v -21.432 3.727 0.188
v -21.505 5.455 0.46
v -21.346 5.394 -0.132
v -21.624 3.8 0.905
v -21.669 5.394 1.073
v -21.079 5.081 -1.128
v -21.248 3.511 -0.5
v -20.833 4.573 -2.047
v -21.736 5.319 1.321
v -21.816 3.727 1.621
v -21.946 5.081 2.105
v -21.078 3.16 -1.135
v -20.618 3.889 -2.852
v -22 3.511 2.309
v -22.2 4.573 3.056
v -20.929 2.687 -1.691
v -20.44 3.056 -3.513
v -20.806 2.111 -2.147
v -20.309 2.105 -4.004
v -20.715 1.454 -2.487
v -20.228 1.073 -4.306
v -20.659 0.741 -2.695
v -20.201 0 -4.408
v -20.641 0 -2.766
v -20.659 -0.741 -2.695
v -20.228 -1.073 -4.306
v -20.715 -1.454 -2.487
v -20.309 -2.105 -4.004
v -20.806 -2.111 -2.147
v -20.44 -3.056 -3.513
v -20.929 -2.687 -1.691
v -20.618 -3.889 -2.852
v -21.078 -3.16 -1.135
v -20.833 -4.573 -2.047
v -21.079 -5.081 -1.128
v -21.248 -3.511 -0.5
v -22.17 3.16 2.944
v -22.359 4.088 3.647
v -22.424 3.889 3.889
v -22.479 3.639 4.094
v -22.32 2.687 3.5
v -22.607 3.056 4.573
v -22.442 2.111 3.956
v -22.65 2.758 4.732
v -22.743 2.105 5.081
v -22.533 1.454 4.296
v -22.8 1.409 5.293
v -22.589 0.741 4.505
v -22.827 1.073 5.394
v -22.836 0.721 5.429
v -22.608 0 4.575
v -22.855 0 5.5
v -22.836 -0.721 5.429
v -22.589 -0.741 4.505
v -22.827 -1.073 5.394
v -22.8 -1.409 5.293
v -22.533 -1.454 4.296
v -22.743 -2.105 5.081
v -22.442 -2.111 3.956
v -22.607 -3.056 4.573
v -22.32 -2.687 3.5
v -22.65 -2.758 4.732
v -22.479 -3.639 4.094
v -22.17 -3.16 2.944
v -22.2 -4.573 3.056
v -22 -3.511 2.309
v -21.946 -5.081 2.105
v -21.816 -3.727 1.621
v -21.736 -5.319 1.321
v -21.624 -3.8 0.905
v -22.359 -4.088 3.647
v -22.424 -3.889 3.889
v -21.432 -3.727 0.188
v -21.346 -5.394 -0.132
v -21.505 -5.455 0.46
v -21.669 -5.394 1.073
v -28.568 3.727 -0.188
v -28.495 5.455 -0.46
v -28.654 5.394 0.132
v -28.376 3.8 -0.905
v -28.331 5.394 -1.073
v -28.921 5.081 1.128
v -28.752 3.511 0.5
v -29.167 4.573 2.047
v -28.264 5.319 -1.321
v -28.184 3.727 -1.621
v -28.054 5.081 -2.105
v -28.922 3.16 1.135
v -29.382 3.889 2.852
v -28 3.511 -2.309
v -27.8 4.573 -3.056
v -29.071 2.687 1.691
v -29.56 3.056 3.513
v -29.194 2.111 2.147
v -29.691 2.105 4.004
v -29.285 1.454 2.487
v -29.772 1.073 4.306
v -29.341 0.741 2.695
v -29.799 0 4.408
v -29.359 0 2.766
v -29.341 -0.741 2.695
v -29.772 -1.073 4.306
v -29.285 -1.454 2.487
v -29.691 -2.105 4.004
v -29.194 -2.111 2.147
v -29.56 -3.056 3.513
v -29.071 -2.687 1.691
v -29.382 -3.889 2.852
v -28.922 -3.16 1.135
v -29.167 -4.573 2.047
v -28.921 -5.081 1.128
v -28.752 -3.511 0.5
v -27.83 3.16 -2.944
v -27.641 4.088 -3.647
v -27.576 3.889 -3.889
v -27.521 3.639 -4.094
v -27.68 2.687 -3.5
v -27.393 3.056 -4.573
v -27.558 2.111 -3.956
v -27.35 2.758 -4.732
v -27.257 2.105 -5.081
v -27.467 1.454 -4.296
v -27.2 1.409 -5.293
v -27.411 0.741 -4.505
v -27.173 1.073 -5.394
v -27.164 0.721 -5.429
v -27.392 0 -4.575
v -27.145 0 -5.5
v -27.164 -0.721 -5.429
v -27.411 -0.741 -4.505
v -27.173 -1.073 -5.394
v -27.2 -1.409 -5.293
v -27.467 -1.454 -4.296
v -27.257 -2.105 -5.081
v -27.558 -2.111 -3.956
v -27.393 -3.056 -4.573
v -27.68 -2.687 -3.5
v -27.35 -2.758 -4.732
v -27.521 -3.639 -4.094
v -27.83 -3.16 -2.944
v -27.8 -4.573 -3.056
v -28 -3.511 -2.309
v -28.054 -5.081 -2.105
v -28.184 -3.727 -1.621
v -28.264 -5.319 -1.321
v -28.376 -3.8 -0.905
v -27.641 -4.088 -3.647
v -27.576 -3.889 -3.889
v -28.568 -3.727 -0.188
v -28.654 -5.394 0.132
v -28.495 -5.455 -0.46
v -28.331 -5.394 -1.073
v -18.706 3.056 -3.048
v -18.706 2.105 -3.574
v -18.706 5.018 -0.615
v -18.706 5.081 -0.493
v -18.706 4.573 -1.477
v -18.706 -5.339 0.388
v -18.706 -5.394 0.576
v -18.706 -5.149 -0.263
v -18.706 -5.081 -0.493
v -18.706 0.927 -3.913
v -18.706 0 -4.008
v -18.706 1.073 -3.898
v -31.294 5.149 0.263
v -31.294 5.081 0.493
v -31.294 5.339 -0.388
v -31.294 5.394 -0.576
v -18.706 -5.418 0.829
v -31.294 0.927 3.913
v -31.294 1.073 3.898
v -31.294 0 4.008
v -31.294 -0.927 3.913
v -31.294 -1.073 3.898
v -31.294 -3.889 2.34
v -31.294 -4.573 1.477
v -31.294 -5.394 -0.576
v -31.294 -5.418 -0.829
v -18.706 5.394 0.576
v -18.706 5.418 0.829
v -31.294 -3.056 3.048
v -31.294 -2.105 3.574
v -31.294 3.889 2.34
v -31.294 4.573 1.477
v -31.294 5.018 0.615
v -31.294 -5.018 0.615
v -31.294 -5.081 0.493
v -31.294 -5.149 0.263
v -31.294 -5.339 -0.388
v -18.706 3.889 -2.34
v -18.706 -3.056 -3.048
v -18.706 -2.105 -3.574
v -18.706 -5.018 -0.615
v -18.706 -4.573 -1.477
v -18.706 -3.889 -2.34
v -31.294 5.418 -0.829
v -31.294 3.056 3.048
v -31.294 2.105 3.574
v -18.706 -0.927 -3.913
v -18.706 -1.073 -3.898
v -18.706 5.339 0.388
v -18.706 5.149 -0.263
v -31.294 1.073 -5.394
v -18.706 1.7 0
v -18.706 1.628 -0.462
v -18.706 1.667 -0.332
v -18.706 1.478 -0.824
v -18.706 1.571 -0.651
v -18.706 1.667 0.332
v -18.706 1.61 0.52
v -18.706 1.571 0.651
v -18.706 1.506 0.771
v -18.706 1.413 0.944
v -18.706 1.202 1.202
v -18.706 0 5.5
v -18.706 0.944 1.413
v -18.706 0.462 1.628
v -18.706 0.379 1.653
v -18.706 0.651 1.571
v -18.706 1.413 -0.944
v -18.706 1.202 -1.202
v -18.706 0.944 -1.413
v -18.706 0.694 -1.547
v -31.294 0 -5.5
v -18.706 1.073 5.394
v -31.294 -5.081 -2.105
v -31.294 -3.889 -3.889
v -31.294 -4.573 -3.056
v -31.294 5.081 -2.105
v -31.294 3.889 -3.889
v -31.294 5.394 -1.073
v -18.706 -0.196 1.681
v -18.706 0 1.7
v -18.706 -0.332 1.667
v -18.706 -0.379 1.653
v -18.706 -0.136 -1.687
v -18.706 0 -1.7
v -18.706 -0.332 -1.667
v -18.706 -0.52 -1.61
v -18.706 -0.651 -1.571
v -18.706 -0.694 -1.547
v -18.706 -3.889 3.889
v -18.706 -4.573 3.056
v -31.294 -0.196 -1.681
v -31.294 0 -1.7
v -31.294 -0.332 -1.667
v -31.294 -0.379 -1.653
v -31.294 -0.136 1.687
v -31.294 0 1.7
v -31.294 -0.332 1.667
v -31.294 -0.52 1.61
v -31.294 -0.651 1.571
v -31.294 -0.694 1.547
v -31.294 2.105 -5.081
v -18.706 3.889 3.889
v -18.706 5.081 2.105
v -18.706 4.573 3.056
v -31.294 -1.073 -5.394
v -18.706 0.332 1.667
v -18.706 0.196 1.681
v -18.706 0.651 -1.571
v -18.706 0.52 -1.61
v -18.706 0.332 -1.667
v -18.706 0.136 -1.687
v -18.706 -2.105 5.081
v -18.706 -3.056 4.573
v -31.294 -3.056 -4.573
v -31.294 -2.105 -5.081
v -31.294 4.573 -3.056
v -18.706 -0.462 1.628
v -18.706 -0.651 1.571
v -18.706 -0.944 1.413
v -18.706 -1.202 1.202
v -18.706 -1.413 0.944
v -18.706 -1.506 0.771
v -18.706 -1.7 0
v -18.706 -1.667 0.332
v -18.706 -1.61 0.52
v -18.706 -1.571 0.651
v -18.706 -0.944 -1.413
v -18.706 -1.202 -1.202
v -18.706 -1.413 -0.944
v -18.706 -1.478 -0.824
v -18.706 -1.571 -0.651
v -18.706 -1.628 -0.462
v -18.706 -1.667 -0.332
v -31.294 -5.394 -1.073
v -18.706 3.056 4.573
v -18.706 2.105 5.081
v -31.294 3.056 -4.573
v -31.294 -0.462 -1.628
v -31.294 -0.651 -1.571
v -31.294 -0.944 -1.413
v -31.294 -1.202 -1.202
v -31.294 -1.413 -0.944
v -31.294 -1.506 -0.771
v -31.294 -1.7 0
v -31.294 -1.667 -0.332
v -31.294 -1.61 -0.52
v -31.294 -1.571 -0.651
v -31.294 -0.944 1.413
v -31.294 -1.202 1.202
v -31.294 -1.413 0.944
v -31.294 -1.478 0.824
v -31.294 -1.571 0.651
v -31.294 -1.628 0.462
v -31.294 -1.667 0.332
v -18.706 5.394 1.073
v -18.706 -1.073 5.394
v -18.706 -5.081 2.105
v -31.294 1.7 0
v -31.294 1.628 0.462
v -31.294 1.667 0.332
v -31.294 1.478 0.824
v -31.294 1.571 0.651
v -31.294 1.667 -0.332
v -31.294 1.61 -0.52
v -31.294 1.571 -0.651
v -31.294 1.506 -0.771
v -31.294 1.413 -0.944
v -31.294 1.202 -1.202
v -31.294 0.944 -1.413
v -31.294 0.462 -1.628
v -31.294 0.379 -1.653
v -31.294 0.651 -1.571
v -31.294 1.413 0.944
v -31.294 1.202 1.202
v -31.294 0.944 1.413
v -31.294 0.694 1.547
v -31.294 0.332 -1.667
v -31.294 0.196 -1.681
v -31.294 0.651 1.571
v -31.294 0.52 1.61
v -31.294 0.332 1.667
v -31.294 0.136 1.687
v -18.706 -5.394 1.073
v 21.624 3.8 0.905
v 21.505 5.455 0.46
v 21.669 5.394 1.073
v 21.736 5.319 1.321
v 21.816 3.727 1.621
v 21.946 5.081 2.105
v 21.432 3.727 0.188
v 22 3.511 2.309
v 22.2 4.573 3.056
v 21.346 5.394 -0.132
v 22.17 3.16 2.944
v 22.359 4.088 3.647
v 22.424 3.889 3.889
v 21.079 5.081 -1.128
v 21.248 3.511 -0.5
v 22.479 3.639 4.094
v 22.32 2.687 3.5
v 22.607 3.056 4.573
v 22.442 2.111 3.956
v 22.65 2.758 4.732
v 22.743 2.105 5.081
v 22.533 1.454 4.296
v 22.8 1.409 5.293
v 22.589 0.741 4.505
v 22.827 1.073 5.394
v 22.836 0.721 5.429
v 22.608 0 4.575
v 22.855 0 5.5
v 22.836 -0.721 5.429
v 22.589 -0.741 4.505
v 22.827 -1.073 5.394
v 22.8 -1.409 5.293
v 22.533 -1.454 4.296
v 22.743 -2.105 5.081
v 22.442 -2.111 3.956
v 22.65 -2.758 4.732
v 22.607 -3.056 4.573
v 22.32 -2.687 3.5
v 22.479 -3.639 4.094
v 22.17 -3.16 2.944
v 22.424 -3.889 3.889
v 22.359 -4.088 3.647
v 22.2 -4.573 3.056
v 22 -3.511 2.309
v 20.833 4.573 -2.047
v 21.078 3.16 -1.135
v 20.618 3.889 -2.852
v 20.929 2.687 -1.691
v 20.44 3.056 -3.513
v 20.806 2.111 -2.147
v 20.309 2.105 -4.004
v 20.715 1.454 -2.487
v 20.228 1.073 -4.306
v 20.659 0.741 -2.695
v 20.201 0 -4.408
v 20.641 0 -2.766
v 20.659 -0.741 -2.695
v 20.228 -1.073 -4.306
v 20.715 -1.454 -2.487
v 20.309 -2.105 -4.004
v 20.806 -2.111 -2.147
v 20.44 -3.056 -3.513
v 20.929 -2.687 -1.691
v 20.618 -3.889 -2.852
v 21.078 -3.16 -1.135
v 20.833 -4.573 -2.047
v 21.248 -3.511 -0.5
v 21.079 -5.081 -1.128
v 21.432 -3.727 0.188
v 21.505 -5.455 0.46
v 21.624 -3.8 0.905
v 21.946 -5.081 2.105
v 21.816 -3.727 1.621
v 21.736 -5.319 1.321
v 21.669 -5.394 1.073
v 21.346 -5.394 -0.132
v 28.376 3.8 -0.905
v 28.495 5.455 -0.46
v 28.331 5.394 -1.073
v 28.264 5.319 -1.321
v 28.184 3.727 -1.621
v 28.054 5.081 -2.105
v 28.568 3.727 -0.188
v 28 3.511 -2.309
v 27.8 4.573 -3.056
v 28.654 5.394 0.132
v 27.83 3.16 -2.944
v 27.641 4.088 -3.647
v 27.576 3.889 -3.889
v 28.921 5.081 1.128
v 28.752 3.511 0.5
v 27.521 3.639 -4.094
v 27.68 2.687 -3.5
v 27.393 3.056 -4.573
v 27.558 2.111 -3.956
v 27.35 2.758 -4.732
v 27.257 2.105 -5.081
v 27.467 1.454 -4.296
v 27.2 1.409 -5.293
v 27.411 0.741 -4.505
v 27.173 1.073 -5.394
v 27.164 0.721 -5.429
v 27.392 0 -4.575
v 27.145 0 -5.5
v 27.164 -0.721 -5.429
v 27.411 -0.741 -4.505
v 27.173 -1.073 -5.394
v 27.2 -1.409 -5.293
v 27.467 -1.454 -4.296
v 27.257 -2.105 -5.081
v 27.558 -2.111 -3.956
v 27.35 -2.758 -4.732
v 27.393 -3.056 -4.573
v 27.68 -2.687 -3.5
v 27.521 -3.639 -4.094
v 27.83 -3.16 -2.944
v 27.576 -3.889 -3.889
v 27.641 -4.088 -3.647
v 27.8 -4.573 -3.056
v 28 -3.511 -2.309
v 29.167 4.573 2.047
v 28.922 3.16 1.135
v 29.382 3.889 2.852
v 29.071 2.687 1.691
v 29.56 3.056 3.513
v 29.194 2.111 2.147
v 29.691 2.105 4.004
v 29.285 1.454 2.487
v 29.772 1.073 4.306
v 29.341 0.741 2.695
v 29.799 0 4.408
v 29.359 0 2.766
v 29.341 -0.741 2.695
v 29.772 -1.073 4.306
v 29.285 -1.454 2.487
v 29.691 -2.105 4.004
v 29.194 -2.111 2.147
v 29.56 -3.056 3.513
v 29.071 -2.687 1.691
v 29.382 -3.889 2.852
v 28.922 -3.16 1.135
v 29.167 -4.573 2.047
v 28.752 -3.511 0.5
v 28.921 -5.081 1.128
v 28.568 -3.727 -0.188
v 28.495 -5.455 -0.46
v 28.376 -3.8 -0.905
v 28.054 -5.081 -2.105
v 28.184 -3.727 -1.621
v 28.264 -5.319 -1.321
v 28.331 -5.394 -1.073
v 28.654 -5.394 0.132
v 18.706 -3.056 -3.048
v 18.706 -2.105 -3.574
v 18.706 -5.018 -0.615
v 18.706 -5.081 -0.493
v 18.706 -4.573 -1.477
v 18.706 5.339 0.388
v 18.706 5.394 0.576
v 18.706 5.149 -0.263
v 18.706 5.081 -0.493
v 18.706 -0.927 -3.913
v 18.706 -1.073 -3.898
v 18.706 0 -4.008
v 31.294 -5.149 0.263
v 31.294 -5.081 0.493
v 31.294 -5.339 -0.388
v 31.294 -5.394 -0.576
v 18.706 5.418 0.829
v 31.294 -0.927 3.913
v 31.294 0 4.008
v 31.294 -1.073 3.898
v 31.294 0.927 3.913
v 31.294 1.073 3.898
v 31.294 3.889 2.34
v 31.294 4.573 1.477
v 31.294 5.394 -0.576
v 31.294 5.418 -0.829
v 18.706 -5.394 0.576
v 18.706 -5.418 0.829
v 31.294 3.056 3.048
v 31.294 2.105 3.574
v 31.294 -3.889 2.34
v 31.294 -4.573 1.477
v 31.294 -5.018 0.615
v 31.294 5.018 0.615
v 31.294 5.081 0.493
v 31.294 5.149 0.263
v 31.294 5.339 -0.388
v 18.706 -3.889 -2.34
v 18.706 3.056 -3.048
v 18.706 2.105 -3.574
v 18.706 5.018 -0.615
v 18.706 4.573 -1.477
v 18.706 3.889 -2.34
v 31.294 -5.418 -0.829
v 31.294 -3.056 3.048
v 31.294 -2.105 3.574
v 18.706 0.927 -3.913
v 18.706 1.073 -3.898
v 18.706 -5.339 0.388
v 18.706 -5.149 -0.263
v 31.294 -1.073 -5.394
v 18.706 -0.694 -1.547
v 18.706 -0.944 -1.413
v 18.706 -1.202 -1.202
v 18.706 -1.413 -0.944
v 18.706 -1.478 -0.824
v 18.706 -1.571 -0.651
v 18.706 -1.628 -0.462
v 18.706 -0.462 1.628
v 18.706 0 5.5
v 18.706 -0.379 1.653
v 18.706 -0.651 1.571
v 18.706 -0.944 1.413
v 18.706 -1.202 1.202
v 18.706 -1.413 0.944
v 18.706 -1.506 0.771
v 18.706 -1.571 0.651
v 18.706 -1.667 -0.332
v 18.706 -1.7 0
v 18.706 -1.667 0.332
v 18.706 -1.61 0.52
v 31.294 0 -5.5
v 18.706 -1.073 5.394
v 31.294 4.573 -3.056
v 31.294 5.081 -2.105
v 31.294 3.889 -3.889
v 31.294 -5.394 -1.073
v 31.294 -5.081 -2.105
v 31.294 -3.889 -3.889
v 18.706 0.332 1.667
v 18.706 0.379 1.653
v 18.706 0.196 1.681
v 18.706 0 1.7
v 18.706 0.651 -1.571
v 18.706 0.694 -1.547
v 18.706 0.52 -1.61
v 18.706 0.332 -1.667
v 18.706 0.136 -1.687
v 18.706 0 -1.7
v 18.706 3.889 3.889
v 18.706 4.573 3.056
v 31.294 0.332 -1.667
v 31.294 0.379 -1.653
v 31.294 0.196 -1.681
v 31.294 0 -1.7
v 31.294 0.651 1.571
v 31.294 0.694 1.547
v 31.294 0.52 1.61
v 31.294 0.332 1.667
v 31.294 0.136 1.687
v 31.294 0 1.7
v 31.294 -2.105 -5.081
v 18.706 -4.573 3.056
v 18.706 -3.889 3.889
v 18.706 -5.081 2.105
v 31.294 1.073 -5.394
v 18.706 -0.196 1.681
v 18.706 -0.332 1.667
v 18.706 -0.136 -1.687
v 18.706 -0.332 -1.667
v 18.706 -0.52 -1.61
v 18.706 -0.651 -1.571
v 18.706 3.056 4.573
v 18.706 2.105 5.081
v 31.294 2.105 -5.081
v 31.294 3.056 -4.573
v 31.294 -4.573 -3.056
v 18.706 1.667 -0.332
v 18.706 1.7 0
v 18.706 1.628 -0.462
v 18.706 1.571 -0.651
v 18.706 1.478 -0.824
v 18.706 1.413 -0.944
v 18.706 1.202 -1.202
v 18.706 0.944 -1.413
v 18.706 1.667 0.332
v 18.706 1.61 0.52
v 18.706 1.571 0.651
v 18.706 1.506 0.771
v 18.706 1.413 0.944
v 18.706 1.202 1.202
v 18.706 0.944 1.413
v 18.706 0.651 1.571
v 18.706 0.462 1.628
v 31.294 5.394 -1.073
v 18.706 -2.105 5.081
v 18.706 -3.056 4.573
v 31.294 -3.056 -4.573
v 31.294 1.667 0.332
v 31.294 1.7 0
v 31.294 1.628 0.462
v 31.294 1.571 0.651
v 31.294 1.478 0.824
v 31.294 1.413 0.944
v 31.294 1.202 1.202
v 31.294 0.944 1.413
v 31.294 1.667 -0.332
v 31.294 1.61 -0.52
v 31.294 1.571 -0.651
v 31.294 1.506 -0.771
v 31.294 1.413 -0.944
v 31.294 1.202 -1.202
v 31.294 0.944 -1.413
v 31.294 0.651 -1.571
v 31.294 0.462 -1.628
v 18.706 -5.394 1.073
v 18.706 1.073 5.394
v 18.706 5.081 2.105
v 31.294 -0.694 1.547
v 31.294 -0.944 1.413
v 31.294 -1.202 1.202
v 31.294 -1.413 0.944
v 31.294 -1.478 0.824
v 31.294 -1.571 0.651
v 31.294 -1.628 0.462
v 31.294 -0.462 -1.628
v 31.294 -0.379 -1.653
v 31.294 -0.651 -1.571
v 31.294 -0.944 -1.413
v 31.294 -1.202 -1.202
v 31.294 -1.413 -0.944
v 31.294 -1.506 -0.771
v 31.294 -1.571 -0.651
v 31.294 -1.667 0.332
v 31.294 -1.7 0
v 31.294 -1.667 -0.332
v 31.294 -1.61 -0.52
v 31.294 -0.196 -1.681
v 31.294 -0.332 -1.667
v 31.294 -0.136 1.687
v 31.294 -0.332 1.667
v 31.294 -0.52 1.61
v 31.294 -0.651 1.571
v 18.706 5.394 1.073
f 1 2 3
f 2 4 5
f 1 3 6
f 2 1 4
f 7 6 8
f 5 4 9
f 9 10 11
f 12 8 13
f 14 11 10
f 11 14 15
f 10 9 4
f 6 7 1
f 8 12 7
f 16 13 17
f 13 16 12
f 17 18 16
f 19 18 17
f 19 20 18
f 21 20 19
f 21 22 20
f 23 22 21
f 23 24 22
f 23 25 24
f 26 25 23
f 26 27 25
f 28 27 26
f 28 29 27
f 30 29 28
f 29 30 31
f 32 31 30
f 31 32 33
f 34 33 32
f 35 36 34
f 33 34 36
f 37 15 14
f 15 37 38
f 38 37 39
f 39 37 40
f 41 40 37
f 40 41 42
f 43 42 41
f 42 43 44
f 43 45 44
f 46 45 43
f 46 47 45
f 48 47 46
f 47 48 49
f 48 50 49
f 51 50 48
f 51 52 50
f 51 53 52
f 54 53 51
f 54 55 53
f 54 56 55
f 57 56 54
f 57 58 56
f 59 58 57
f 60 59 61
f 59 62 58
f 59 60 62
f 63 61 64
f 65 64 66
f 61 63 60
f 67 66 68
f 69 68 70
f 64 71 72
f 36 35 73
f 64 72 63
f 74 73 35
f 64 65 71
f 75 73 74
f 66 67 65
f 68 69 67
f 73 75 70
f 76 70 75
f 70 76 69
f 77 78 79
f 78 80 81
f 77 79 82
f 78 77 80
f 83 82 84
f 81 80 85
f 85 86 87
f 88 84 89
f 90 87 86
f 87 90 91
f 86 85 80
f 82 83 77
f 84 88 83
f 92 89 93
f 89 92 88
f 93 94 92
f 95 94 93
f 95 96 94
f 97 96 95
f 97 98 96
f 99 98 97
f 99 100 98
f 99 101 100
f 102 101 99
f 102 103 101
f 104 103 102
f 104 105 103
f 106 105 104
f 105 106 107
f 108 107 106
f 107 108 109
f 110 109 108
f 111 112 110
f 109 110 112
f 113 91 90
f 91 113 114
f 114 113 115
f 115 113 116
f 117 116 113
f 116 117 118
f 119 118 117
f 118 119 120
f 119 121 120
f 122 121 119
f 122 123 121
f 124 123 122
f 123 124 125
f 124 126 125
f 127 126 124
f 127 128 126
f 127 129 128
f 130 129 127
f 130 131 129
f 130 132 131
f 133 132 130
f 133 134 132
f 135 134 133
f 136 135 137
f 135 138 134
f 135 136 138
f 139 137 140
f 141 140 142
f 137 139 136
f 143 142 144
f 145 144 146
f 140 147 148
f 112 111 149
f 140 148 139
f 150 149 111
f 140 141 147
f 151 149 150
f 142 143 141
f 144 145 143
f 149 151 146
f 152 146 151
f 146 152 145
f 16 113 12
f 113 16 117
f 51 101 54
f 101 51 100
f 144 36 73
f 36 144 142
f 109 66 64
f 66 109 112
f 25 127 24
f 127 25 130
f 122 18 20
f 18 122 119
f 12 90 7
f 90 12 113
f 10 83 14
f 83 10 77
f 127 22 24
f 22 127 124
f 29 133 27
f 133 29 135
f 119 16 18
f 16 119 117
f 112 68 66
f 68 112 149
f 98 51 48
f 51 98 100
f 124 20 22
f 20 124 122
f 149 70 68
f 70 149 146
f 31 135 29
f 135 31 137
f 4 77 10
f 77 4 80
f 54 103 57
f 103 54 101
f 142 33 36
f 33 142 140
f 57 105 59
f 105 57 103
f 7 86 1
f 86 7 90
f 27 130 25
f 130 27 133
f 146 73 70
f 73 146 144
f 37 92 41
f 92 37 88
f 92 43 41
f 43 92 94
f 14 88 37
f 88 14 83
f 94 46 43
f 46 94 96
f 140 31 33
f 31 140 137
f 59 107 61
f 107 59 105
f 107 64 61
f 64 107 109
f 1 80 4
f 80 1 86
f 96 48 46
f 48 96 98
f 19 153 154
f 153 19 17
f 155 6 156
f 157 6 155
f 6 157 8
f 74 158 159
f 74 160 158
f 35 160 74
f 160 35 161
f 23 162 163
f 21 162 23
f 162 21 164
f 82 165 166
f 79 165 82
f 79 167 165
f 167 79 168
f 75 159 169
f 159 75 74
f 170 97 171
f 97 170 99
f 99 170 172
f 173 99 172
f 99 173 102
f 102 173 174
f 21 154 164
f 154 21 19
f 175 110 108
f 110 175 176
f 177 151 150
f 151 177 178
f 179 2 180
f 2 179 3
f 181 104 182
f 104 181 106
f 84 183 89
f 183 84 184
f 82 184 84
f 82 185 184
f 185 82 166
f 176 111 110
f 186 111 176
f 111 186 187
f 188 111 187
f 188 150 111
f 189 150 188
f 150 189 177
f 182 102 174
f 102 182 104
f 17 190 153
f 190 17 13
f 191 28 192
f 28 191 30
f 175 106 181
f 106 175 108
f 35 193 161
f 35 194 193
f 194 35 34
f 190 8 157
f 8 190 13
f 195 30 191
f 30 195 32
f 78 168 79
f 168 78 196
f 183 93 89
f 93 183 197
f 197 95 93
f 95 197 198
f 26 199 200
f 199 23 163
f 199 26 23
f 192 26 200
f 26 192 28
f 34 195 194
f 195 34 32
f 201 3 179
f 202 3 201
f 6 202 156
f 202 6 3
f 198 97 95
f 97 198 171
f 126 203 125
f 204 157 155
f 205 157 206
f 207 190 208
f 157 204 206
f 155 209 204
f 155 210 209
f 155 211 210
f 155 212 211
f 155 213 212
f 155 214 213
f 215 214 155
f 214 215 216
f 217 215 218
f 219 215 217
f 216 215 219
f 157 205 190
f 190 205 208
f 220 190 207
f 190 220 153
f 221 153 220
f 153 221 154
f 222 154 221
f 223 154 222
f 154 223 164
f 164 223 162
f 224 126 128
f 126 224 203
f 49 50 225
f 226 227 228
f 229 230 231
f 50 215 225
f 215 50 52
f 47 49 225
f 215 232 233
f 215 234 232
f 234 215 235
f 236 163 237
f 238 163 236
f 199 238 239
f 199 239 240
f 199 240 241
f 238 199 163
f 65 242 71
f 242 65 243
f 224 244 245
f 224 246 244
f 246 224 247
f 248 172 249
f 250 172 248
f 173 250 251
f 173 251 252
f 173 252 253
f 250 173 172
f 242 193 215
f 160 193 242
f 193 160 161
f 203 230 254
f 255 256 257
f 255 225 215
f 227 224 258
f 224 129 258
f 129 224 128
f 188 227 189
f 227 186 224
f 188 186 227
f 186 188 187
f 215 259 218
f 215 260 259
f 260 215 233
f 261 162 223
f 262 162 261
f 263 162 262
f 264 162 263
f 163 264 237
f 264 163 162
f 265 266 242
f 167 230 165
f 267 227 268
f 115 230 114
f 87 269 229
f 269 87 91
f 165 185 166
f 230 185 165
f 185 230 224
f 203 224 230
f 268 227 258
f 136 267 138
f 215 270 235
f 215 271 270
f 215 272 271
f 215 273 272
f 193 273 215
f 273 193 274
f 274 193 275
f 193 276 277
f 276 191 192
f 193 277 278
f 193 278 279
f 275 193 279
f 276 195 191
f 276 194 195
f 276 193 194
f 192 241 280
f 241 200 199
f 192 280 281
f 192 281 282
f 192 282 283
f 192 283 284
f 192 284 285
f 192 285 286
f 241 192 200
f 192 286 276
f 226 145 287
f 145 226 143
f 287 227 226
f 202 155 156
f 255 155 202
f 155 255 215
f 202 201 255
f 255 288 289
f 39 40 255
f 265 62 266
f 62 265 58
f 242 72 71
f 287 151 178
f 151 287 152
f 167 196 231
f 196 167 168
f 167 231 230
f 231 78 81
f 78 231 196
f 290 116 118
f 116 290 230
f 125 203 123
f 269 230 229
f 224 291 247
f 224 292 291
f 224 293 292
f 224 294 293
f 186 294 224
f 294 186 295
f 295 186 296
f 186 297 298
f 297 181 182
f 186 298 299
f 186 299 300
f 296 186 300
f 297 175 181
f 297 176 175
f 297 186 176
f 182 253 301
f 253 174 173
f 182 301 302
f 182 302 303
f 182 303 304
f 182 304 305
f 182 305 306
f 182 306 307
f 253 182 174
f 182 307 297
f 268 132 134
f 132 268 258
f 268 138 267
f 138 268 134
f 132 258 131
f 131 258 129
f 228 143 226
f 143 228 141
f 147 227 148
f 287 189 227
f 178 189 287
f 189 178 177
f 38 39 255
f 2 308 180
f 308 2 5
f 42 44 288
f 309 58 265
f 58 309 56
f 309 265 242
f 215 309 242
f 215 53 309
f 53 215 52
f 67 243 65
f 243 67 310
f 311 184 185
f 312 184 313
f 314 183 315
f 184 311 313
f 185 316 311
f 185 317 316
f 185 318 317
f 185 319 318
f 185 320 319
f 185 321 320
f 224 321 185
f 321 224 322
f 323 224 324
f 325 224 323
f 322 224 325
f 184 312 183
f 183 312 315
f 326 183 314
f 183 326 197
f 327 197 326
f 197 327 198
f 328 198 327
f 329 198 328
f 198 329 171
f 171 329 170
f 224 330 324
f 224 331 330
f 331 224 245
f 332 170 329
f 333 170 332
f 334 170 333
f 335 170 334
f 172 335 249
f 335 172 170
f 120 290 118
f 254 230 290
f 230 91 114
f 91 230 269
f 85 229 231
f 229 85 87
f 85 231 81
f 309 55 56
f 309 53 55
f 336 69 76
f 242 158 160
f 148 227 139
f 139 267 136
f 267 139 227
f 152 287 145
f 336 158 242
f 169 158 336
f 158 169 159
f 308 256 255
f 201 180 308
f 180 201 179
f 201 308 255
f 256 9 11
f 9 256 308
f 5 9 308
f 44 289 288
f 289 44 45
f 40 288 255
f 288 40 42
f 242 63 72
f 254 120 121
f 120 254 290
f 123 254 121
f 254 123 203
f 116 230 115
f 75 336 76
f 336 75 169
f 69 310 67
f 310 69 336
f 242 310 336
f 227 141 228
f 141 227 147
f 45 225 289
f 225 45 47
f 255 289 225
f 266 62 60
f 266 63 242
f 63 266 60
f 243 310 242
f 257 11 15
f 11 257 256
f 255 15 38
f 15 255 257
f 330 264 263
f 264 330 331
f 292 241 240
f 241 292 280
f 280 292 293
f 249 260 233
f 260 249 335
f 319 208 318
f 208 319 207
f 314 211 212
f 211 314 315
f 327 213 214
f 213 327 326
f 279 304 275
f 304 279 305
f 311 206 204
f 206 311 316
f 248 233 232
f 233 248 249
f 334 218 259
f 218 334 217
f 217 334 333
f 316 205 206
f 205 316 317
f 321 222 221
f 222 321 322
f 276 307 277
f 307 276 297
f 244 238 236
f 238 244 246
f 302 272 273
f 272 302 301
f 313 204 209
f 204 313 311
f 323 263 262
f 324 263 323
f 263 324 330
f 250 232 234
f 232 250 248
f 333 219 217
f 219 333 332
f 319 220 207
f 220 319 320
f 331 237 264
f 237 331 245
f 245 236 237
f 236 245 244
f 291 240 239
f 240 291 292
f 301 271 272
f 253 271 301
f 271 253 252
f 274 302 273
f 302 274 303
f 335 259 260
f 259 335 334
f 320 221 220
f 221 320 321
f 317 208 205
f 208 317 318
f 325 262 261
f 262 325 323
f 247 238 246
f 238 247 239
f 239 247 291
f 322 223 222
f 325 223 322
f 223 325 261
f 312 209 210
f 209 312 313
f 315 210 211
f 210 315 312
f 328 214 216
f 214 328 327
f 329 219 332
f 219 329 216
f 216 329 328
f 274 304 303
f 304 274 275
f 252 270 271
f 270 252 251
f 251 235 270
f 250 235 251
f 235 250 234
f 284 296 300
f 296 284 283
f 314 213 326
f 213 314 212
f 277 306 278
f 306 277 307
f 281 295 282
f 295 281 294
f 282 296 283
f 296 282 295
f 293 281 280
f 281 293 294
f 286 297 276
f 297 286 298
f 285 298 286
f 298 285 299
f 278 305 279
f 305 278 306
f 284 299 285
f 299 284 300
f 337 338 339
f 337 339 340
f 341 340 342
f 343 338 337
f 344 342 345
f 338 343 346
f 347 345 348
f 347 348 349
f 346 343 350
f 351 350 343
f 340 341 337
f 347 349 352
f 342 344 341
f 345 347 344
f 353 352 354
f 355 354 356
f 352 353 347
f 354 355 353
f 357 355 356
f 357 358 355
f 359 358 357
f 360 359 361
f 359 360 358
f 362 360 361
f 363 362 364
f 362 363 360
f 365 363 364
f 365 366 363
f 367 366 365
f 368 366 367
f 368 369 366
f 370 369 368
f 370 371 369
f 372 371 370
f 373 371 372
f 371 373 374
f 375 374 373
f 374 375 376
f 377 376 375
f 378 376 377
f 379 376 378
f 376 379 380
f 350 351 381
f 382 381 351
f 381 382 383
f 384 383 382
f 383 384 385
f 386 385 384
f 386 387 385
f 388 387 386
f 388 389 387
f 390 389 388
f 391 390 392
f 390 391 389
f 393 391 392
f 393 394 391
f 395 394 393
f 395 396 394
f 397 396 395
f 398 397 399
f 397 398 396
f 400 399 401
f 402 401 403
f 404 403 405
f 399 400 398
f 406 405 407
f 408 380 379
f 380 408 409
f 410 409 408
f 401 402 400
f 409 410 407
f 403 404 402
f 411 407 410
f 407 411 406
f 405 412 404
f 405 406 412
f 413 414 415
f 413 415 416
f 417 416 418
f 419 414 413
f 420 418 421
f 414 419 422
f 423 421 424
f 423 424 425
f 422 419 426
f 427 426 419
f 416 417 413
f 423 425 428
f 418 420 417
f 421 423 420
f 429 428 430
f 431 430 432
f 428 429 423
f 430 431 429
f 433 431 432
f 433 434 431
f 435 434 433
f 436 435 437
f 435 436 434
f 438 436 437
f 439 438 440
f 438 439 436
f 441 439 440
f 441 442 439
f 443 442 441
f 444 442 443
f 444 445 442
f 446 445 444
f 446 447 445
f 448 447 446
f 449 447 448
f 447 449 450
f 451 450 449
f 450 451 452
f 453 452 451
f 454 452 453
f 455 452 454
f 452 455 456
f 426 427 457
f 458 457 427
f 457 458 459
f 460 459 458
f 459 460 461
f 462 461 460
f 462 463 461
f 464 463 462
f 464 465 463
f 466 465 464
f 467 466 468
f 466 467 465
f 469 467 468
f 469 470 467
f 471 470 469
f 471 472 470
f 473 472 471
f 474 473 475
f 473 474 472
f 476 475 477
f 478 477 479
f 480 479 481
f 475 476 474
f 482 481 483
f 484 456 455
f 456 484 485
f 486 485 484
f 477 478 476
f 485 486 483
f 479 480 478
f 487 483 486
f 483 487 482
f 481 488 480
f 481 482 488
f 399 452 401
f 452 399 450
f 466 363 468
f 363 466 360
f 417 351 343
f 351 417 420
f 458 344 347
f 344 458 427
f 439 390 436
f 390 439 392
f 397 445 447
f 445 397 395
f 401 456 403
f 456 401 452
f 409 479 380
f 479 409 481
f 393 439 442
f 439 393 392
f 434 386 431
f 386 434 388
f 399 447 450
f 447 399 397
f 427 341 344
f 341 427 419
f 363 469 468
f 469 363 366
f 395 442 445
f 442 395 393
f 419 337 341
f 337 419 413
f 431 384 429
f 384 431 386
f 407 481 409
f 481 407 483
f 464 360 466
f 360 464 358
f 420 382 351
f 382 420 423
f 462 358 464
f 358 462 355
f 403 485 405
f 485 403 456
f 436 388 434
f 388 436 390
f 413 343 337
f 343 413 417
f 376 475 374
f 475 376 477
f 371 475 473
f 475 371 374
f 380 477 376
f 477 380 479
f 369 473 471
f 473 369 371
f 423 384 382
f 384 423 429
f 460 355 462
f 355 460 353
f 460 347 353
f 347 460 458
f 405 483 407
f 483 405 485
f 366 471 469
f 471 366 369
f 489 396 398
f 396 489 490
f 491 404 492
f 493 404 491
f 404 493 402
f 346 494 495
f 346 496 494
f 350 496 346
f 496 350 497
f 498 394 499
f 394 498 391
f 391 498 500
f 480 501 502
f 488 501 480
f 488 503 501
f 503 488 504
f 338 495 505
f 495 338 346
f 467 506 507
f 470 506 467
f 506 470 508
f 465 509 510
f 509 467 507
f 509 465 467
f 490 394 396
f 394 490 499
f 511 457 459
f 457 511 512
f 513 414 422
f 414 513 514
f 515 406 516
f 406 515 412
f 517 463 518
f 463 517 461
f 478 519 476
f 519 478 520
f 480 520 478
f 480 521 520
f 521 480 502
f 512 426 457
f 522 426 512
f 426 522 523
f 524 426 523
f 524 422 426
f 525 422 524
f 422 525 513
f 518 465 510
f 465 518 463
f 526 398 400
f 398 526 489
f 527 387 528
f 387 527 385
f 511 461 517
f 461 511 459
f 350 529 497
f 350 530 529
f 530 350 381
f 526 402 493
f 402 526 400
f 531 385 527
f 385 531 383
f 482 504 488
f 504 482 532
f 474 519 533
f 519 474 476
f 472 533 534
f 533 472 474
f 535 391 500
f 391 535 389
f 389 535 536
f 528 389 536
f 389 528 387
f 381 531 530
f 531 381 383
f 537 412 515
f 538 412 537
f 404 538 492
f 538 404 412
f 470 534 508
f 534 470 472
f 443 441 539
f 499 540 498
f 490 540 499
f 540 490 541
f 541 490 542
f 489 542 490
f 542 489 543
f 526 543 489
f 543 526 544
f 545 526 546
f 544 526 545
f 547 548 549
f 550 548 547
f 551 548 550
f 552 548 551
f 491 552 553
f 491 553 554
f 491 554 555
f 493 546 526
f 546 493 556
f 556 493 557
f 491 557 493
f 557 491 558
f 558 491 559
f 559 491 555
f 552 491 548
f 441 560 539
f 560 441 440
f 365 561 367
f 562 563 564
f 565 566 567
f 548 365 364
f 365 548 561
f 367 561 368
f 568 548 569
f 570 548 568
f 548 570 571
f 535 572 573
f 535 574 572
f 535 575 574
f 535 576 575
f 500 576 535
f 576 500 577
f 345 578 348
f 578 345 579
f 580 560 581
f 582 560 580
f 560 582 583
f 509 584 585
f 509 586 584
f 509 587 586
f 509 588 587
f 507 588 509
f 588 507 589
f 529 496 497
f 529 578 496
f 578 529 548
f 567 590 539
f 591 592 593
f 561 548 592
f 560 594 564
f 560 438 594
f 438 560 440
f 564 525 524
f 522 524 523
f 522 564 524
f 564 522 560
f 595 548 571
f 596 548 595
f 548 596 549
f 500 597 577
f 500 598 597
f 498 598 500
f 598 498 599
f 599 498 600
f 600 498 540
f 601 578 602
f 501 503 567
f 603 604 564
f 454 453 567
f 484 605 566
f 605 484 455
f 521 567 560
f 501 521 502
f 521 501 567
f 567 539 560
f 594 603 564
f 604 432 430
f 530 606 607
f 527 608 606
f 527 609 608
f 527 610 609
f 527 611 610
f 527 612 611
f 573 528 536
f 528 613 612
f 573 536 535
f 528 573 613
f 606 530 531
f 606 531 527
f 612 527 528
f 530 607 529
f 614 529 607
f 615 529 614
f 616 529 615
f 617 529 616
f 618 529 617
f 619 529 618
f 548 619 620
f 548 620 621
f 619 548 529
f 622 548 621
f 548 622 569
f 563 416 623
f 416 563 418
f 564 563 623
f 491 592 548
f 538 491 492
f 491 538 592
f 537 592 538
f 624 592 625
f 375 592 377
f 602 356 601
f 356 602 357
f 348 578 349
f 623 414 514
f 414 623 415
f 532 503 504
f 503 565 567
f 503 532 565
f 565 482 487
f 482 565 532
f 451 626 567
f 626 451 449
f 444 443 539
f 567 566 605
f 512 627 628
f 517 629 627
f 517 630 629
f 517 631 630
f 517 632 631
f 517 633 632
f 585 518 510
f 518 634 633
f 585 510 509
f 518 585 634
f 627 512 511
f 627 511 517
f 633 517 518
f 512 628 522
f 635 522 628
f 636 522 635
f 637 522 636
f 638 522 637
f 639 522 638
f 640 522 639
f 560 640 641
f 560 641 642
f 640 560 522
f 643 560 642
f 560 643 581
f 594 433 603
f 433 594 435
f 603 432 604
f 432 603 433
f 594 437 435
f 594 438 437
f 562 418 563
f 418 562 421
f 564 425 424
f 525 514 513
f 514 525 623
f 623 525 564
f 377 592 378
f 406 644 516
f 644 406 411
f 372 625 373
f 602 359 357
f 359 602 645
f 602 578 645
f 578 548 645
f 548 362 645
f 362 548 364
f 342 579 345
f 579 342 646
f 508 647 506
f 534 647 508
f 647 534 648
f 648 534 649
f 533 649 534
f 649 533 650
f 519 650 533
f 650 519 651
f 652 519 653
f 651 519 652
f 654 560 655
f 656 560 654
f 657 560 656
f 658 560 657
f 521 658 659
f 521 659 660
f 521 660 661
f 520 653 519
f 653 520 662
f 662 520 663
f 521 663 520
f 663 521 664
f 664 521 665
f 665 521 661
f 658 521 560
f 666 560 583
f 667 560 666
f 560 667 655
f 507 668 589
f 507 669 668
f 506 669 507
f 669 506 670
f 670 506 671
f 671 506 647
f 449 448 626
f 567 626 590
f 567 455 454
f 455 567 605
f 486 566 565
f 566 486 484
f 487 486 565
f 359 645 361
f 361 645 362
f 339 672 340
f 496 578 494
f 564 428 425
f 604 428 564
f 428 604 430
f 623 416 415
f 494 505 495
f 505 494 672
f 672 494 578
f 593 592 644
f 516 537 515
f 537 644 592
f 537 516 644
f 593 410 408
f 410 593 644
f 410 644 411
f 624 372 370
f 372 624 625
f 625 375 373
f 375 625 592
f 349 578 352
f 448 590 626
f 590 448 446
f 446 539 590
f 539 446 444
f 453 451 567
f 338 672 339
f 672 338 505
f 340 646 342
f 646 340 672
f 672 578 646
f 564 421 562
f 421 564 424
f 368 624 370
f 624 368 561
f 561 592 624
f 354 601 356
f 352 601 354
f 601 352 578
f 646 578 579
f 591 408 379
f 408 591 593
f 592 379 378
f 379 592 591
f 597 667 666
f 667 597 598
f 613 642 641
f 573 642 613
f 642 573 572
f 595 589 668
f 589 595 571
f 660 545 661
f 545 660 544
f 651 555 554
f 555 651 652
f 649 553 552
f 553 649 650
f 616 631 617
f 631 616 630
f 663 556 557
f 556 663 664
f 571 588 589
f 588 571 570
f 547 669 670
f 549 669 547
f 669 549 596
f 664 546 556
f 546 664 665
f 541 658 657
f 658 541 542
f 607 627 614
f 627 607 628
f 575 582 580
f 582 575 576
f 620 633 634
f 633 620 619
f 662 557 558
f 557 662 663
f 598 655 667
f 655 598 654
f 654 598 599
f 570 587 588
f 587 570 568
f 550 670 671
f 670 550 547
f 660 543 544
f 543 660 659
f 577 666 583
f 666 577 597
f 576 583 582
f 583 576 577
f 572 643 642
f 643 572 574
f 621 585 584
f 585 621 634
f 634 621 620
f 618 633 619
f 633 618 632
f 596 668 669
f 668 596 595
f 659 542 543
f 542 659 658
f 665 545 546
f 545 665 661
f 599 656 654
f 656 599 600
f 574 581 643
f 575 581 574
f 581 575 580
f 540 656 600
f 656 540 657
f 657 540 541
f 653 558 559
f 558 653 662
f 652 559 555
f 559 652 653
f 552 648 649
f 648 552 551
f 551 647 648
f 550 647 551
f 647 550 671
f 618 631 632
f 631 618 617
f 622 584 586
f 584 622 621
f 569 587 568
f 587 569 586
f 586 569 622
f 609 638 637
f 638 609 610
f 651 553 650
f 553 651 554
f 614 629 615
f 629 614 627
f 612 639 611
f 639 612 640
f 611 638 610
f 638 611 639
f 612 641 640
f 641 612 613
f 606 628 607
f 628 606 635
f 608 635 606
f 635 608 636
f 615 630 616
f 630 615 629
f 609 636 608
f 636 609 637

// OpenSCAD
// file: bearing.scad
module bearing(d_out=22,d_in=8,h=7)
{
    difference()
    {
      cylinder(d=d_out,h=h,$fn=32,center=true);
      cylinder(d=d_in,h=h+0.001,$fn=32,center=true);
    }
}

// one half of a grip
module
rod_half_bearing_grip(d_rod=3,angle_rod=0,d_bearing=8,h_bearing=7,clr_d_bearing=0.4,clr_h_bearing=0.4,clr_d_rod=0.4,over=1.5,fn=32)
{
  d1_kuglager=d_bearing;
  h_kuglager=h_bearing;
  spacer_outer_clearance=clr_d_bearing;
  spacer_inner_clearance=clr_d_rod;
  spacer_rim_h=over;
  clearance=clr_h_bearing;

  difference()
  {
    translate([0,0,-h_bearing/2])
    union()
    {
      // fits inside of kuglager
      if(d1_kuglager-spacer_outer_clearance-d_rod-spacer_inner_clearance >
0.1)
        cylinder(d=d1_kuglager-spacer_outer_clearance,h=h_kuglager/3+spacer_rim_h,$fn=32,center=true);
      // spacer rim outside of kuglager
      if(spacer_rim_h > 0.01)
      translate([0,0,(spacer_rim_h)/2-(h_kuglager/3+(spacer_rim_h))/2])
        cylinder(d=d1_kuglager+2*clearance,h=(spacer_rim_h),$fn=32,center=true);
    }
    // hole for the rod
    rotate([0,angle_rod,0])
      cylinder(d=d_rod+spacer_inner_clearance,h=h_kuglager*3,$fn=32,center=true);
    // half-cut of clearance
    // cylinder(d=d1_kuglager,h=clearance,$fn=32,center=true); 
  }
}

// full grip
module
rod_bearing_grip(d_rod=3,angle_rod=0,d_bearing=8,h_bearing=7,clr_d_bearing=0.4,clr_h_bearing=0.4,clr_d_rod=0.4,over=1.5,fn=32)
{
  d1_kuglager=d_bearing;
  h_kuglager=h_bearing;
  spacer_outer_clearance=clr_d_bearing;
  spacer_inner_clearance=clr_d_rod;
  spacer_rim_h=over;
  clearance=clr_h_bearing;

  difference()
  {
    // intersection is for limting box perpendicular to the rod
    intersection()
    {
      // make large outside part first, cut out the bearing space
      difference()
      {
        cylinder(d=d1_kuglager+2*over,h=h_bearing*3,$fn=32,center=true); 
        // cutting out bearing space
        difference()
        {
          // large enough in diameter, smaller h for clean cut
          cylinder(d=d1_kuglager*2,h=h_bearing-0.01,$fn=32,center=true);
          // fits inside of kuglager
          cylinder(d=d1_kuglager-spacer_outer_clearance,h=h_bearing,$fn=32,center=true);
        }
      }
      // here's limiting cylinder perpendicular to the rod, large enough
      rotate([0,angle_rod,0])
        cylinder(d=d1_kuglager+2*over,h=(h_bearing+2*over)*(1+sin(angle_rod)),$fn=32,center=true);
    }


    if(0)
    union()
    {
      // fits inside of kuglager
      cylinder(d=d1_kuglager-spacer_outer_clearance,h=h_bearing,$fn=32,center=true);
      // spacer rim outside of kuglager
      if(0)
      if(spacer_rim_h > 0.01)
      translate([0,0,(spacer_rim_h)/2-(h_kuglager/3+(spacer_rim_h))/2])
        cylinder(d=d1_kuglager+2*clearance,h=(spacer_rim_h),$fn=32,center=true);
    }
    // hole for the rod
    rotate([0,angle_rod,0])
      cylinder(d=d_rod+spacer_inner_clearance,h=h_kuglager*10,$fn=32,center=true);
    // half-cut of clearance
    // cylinder(d=d1_kuglager,h=clearance,$fn=32,center=true); 
  }
}
// file: magnet.scad
module magnet(d=10,h=10,fn=32)
{
  magnet_d=d;
  magnet_h=h;
  cylinder_faces=fn;
  color([0.5,0.5,1]) // blue, north
  translate([0,0,magnet_h/4])
    cylinder(d=magnet_d,h=magnet_h/2,$fn=cylinder_faces,center=true);
  color([1,0.5,0.5]) // red, south
  translate([0,0,-magnet_h/4])
    cylinder(d=magnet_d,h=magnet_h/2,$fn=cylinder_faces,center=true);
}
// main file
// to see animation:
// view->animate, FPS=11, Steps=22
// assembly(disc_out=0,disc_in=0,bearing=0);

thick=1.5; // mm general thickness

tilt=15; // ring tilt
ring_distance=50; // mm from center
d_magnet=10;
h_magnet=5;
n_magnets=16;
magnet_d_clr=1; // clearance in d
magnet_h_clr=0.5; // clearance in h
d_ring=70;
magnet_distance=16;
magnet_over=ring_distance*0.3;
polarity=-1;

// bearing
bearing_d_out=22;
bearing_d_in=8;
bearing_h=7;

// plastic outer ring dimension
out_d_out=d_ring+h_magnet+2*thick;
out_d_in=d_ring-h_magnet;
out_d_h=d_magnet+2*thick;

// pastic inner ring dimension (holds bearing to the outer ring)
in_out_d_clr=0.7; // inner-to-outer ring clearance
in_bearing_d_clr=0.3;
in_bearing_h_clr=0.0;
in_d_out=out_d_in+2*thick; // inner dia
in_d_in=bearing_d_out+in_bearing_d_clr;
in_h=out_d_h+2*thick;

// screw
l_screw=6; // thread length
d_screw=2.2; // thread dia
d_screw_head=5; // screw head dia
h_screw_transition=d_screw; // easy 3dprint

include <magnet.scad>
include <bearing.scad>

module ring_of_magnets(d=70,n=12,dm=6,hm=10,rot=90)
{
  angle=360/n;
  union()
  {
    for(i=[0:n-1])
    {
      rotate([0,0,angle*i])
        translate([d/2,0,0])
           rotate([0,rot,0])
             magnet(d=dm, h=hm+0);
    }
  }
}

module outer_plastic_ring(d_out=80,d_in=60,h=20,fn=32)
{
  difference()
  {
    cylinder(d=d_out,h=h,$fn=fn,center=true);
    cylinder(d=d_in,h=h+0.01,$fn=fn,center=true);
    ring_of_magnets(d=d_ring-magnet_h_clr,n=n_magnets,rot=90,dm=d_magnet+magnet_d_clr,hm=h_magnet+magnet_h_clr*2);

  }
}

module inner_plastic_ring(d_out=60, d_in=30,h=20,in_half_clr=0.5,bulk=3,prongs=4,prong_d=10,d_trench=60,h_trench=12,d_bearing=22,h_bearing=7,d_screw_reinforce=8,fn=32)
{
  difference()
  {
  union()
  {
    // outer ring to hold magnets
    difference()
    {
      cylinder(d=d_out,h=h,$fn=fn,center=true);
      cylinder(d=d_trench-2*bulk,h=h+0.01,$fn=fn,center=true);        
    }
    
    // prongs
    l_prong=(d_out-bulk - (d_in+bulk))/2;
    for(i=[0:prongs-1])
      rotate([0,0,i*360/prongs])
      {
        // the prong
        translate([0.5*(d_in+bulk)+l_prong/2,0,0])
          cube([l_prong,bulk,h],center=true);
        // inner screw reinforcement
        translate([(d_in+2*bulk)/2,0,0])
          rotate([0,0,90])
            cylinder(d=d_screw_reinforce,h=h,$fn=6,center=true);

        // outer screw reinforcement
        translate([(d_trench-2*bulk)/2,0,0])
          rotate([0,0,90])
            cylinder(d=d_screw_reinforce,h=h,$fn=6,center=true);

      }

    // inner ring to hold the baring
    difference()
    {
      cylinder(d=d_in+2*bulk,h=h,$fn=fn,center=true);
      cylinder(d=d_in-2*thick,h=h+0.01,$fn=fn,center=true);        
    }


  }
  
    // drill screw holes
    for(i=[0:prongs-1])
      rotate([0,0,i*360/prongs])
      {
        // inner circle, small hole
        translate([(d_in+2*bulk)/2,0,0])
        {
          // thread
          cylinder(d=1.8,h=h+0.01,$fn=6,center=true);
          // bigger hole, no contact
          translate([0,0,h/2])
            cylinder(d=2.5,h=h+0.01,$fn=6,center=true);
          // head
          translate([0,0,h/2+l_screw/2+h_screw_transition])
            cylinder(d=d_screw_head,h=h,$fn=16,center=true);
          translate([0,0,h_screw_transition/2+l_screw/2])
            cylinder(d2=d_screw_head,d1=1.8,h=h_screw_transition+0.01,$fn=16,center=true);
        }
        // outer circle, small hole
        translate([(d_trench-2*bulk)/2,0,0])
        {
          // thread
          cylinder(d=1.8,h=h+0.01,$fn=6,center=true);
          // bigger hole, no contact
          translate([0,0,h/2])
          cylinder(d=2.5,h=h+0.01,$fn=6,center=true);
          // head
          translate([0,0,h/2+l_screw/2+h_screw_transition])
            cylinder(d=d_screw_head,h=h,$fn=16,center=true);
          // transition
          translate([0,0,h_screw_transition/2+l_screw/2])
            cylinder(d2=d_screw_head,d1=1.8,h=h_screw_transition+0.01,$fn=16,center=true);


        }

      }
      
    // cut trench for outer ring
    difference()
    {
        cylinder(d=2*d_out+0.01,h=h_trench,$fn=fn,center=true);
        cylinder(d=d_trench,h=h_trench+0.01,$fn=fn,center=true);
    }
  
    // cut half-side clearing
    cylinder(d=d_out+0.01,h=in_half_clr,$fn=fn,center=true);
  
    // cut bearing slit
    cylinder(d=d_bearing+in_bearing_d_clr,h=h_bearing+in_bearing_h_clr,$fn=64,center=true);
  }
}

module threaded_rod()
{
  rotate([0,90,0])
    cylinder(d=3,h=ring_distance+3*out_d_h,$fn=6,center=true);
}


module assembly(rotor_magnets=1,bearing=1,disc_out=1,disc_in=1,stator_magnets=1,bearing_grip=1)
{

  // rotors: sign for left/right
  for(sign=[-1:2:1])
  {
    translate([sign*ring_distance/2,0,0])
    rotate([0,90+sign*tilt,0])
      rotate([0,0,-polarity*$t*360/n_magnets])
        union()
        {
          // rotor magnets
          if(rotor_magnets > 0.5)
          %ring_of_magnets(d=d_ring,n=n_magnets,rot=sign*90,dm=d_magnet,hm=h_magnet);
          // holds magnets from outside
          // magnets are in repulsion,
          // trying to increase ring diameter

          if(disc_out > 0.5)
            outer_plastic_ring(d_out=out_d_out,d_in=out_d_in,h=out_d_h);

          if(bearing > 0.5)
            %bearing();
          
          if(bearing_grip > 0.5)
          {
            //translate([0,0,-bearing_h/2])
              if(0)
              rotate([0,90-90*sign,90+90*sign])
              rod_bearing_grip(angle_rod=tilt);
            //translate([0,0,bearing_h/2])
              if(1)
              rotate([0,90+90*sign,90+90*sign])
              rod_bearing_grip(angle_rod=tilt);
          }
          
          if(disc_in > 0.5)
            inner_plastic_ring(d_out=in_d_out,d_in=in_d_in,h=in_h,d_trench=out_d_in-in_out_d_clr,h_trench=out_d_h);
        }
    }

    // the rod
    if(threaded_rod > 0.5)
        %threaded_rod();

    // stator magnets
    if(stator_magnets > 0.5)
      for(sign=[-1:2:1])
        translate([0,sign*(d_ring/2+magnet_distance),0])
          rotate([0,sign*polarity*90,0])
            %magnet(d=d_magnet,h=ring_distance+magnet_over);
}

if(1)
assembly(disc_out=0,disc_in=0,bearing=1,bearing_grip=1,threaded_rod=1);

// outer ring
if(0)
  difference()
  {
    outer_plastic_ring(d_out=out_d_out,d_in=out_d_in,h=out_d_h);
  }

// inner ring
if(0)
            difference()
          {
            inner_plastic_ring(d_out=in_d_out,d_in=in_d_in,h=in_h,d_trench=out_d_in-in_out_d_clr,h_trench=out_d_h);
              if(1)
              translate([0,0,-50])
              cube([100,100,100],center=true);
          }

// bearing grips
if(0)
  for(i=[-2:2])
   translate([20*i,0,0])
      rod_bearing_grip();
  
        
